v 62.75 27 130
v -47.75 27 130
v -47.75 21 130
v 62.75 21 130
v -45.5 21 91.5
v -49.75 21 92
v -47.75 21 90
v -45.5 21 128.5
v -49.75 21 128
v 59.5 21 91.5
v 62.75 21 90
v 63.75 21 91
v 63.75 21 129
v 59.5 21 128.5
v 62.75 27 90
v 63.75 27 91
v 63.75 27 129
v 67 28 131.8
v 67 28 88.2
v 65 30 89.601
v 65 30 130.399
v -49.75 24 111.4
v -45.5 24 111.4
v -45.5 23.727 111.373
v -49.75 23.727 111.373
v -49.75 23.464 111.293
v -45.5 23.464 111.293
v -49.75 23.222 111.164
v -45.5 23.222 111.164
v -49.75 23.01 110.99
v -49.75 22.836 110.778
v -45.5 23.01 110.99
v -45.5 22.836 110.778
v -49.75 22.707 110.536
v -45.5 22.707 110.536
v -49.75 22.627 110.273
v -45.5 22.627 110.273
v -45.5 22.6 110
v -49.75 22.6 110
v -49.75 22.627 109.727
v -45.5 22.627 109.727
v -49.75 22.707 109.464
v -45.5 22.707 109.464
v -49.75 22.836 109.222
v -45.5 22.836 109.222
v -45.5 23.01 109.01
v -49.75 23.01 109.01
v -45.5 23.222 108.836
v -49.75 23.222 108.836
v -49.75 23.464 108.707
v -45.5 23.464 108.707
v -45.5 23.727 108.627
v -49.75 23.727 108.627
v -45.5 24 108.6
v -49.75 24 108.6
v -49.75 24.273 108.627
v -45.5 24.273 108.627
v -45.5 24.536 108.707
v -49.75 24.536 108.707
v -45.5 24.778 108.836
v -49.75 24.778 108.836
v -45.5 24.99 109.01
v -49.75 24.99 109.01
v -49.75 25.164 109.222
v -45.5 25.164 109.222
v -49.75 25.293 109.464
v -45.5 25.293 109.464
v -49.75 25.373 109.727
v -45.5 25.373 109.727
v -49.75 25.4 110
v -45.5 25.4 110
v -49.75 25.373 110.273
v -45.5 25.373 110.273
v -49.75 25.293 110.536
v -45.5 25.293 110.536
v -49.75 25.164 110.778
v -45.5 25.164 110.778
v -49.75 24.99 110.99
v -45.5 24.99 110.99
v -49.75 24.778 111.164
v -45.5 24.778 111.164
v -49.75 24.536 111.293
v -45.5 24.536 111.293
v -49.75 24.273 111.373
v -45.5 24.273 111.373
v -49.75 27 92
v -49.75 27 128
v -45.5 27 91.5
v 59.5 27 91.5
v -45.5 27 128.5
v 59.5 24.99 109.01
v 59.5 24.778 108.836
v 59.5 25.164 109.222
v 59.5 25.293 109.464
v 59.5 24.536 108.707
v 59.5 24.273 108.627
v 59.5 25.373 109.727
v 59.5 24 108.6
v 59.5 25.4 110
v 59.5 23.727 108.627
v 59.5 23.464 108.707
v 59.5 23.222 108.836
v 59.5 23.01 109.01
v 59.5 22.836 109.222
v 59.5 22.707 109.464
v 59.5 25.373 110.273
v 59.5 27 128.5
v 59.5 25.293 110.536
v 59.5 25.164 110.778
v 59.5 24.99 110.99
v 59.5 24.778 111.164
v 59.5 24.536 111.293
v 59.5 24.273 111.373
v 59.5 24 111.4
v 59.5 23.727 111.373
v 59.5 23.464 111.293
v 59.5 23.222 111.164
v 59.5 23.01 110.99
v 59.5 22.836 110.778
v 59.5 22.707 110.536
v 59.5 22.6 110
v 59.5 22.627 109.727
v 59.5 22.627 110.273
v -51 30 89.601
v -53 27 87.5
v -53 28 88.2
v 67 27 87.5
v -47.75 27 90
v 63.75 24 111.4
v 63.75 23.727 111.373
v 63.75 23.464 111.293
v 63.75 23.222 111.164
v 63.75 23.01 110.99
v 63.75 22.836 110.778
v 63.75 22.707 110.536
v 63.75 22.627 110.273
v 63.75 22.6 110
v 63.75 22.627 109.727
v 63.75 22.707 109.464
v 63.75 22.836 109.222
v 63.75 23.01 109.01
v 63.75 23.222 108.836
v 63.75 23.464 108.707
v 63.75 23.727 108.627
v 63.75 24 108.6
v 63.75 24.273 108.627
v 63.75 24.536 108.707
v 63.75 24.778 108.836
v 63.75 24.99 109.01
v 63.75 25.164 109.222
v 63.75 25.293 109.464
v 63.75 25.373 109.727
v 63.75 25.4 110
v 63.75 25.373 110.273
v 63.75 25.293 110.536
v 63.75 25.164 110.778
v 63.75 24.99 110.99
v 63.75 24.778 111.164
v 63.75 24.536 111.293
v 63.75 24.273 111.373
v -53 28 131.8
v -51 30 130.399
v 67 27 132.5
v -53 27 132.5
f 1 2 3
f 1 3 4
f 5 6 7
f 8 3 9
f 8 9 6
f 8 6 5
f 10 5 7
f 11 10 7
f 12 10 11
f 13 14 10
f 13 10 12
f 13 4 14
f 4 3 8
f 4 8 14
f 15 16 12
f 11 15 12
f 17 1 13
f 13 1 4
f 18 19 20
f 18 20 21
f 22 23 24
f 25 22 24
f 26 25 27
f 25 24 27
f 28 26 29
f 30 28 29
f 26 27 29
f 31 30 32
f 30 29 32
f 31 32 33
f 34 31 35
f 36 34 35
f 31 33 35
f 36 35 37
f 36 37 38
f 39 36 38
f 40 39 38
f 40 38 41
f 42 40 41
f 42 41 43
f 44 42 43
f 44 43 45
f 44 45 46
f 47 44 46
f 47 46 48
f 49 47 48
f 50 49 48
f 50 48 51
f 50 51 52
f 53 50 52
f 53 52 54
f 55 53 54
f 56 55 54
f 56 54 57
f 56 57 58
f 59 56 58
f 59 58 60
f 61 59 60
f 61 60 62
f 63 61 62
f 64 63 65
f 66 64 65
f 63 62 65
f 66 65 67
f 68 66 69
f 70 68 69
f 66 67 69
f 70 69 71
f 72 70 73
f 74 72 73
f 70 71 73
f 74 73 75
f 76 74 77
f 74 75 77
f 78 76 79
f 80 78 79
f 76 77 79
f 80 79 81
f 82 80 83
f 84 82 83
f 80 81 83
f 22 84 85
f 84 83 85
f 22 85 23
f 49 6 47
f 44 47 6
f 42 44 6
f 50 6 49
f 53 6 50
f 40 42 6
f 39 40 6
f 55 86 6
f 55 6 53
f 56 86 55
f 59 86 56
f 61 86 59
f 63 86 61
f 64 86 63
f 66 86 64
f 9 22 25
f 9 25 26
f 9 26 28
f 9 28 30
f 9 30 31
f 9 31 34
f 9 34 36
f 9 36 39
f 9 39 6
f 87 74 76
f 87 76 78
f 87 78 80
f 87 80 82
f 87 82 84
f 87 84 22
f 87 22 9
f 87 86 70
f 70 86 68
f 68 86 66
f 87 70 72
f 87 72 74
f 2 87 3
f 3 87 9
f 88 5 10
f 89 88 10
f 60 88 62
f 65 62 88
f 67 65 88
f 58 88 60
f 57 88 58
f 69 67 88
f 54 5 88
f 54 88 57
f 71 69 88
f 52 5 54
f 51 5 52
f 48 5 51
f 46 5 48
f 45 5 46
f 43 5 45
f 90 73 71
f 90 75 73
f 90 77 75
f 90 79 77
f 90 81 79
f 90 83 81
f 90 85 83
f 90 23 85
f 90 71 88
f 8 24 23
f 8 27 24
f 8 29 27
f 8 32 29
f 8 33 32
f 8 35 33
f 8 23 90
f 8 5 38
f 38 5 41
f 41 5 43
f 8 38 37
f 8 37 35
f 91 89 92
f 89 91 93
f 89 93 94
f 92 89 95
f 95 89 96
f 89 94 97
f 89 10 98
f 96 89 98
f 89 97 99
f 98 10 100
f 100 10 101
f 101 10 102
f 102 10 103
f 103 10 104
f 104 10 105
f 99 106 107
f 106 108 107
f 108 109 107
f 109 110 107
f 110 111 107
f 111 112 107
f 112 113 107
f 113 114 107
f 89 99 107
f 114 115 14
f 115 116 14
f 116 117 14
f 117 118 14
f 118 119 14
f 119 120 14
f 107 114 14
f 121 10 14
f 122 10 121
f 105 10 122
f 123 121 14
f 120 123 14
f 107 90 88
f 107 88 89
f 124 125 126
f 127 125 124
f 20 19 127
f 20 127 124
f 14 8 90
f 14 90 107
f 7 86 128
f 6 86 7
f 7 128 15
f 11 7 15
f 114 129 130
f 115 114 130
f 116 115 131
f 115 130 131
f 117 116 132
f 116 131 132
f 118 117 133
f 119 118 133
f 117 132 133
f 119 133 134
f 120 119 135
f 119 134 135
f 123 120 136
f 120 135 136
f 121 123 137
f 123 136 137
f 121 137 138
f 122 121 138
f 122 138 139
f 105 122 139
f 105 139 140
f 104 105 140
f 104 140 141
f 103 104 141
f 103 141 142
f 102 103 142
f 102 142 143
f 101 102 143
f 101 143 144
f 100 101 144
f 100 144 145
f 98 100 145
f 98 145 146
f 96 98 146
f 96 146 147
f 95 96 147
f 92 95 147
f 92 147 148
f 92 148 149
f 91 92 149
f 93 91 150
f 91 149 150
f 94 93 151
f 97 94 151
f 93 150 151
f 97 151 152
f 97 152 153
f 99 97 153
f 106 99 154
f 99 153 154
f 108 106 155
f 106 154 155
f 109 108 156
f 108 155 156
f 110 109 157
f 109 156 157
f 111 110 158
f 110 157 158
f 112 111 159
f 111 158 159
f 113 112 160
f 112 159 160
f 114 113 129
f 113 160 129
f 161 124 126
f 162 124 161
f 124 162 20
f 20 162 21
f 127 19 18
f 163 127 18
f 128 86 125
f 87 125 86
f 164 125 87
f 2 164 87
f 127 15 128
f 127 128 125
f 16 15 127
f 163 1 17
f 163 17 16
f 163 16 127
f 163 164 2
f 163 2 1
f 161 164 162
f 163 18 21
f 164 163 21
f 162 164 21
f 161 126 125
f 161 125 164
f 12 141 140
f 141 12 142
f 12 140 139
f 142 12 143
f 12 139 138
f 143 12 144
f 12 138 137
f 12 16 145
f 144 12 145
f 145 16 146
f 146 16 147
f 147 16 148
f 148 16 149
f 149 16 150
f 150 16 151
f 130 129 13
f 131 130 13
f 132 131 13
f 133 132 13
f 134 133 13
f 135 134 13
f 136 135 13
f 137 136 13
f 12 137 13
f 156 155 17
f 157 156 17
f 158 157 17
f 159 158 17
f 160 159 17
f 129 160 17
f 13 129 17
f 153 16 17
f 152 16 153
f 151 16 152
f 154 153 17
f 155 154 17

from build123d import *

# Parameters (mm, degrees)
SKETCH037_W     = 120
SKETCH037_H     = 45
PAD008_DEPTH    = 3
SKETCH038_W     = 113.5
SKETCH038_H     = 40
PAD009_DEPTH    = 6
SKETCH039_R     = 1.4
POCKET026_DEPTH = 116.751
POCKET027_DEPTH = 376.952357
CHAMFER008_SIZE = 2
SKETCH036_W     = 105
SKETCH036_H     = 37
POCKET028_DEPTH = 6
CHAMFER009_SIZE = 2
CHAMFER010_SIZE = 1
CHAMFER011_SIZE = 1
CHAMFER012_SIZE = 2


with BuildPart() as part:
    # Sketch037 → Pad008 (new body)
    with BuildSketch(Plane.XZ):
        Rectangle(SKETCH037_W, SKETCH037_H)
    extrude(amount=PAD008_DEPTH)

    # Sketch038 (on Face6 of Pad008) → Pad009 (join)
    with BuildSketch(Plane.XZ.offset(3)):
        Rectangle(SKETCH038_W, SKETCH038_H)
    extrude(amount=PAD009_DEPTH)

    # Sketch039 (on Face8 of Pad009) → Pocket026 (cut, through all)
    with BuildSketch(Plane(origin=(56.75, 0, 0), x_dir=(0, 0, 1), z_dir=(1, 0, 0))):
        with Locations((0, 6)):
            Circle(SKETCH039_R)
    extrude(amount=-POCKET026_DEPTH, mode=Mode.SUBTRACT)

    # Sketch040 (on Face3 of Pocket026) → Pocket027 (cut, through all)
    with BuildSketch(Plane(origin=(60, 0, 0), x_dir=(0, 0, 1), z_dir=(1, 0, 0))):
        Polygon((-22.5, 3), (-17.875456, -3.604533), (-35.516254, -3.604533), align=None)
    pocket027 = extrude(amount=-POCKET027_DEPTH, mode=Mode.SUBTRACT)

    # Mirrored: Pocket027 across Sketch040 V_Axis
    add(pocket027.mirror(Plane(origin=(60, 0, 0), x_dir=(1, 0, 0), z_dir=(0, 0, 1))), mode=Mode.SUBTRACT)

    # Chamfer008
    chamfer008_edges = [part.edges().sort_by_distance(p)[0] for p in [
        (60, 0, 0),
        (-60, 0, 0),
    ]]
    chamfer(chamfer008_edges, length=CHAMFER008_SIZE)

    # Sketch036 → Pocket028 (cut)
    with BuildSketch(Plane.XZ.offset(9)):
        Rectangle(SKETCH036_W, SKETCH036_H)
    extrude(amount=-POCKET028_DEPTH, mode=Mode.SUBTRACT)

    # Chamfer009
    chamfer009_edges = [part.edges().sort_by_distance(p)[0] for p in [
        (-56.75, -6, -20),
    ]]
    chamfer(chamfer009_edges, length=CHAMFER009_SIZE)

    # Chamfer010
    chamfer010_edges = [part.edges().sort_by_distance(p)[0] for p in [
        (56.75, -6, -20),
    ]]
    chamfer(chamfer010_edges, length=CHAMFER010_SIZE)

    # Chamfer011
    chamfer011_edges = [part.edges().sort_by_distance(p)[0] for p in [
        (56.75, -6, 20),
    ]]
    chamfer(chamfer011_edges, length=CHAMFER011_SIZE)

    # Chamfer012
    chamfer012_edges = [part.edges().sort_by_distance(p)[0] for p in [
        (-56.75, -6, 20),
    ]]
    chamfer(chamfer012_edges, length=CHAMFER012_SIZE)


with BuildPart() as part_1:
    # Body003 placement: moved
    add(part.part.moved(Location((7, 30, 110))))


solid = part_1.part
